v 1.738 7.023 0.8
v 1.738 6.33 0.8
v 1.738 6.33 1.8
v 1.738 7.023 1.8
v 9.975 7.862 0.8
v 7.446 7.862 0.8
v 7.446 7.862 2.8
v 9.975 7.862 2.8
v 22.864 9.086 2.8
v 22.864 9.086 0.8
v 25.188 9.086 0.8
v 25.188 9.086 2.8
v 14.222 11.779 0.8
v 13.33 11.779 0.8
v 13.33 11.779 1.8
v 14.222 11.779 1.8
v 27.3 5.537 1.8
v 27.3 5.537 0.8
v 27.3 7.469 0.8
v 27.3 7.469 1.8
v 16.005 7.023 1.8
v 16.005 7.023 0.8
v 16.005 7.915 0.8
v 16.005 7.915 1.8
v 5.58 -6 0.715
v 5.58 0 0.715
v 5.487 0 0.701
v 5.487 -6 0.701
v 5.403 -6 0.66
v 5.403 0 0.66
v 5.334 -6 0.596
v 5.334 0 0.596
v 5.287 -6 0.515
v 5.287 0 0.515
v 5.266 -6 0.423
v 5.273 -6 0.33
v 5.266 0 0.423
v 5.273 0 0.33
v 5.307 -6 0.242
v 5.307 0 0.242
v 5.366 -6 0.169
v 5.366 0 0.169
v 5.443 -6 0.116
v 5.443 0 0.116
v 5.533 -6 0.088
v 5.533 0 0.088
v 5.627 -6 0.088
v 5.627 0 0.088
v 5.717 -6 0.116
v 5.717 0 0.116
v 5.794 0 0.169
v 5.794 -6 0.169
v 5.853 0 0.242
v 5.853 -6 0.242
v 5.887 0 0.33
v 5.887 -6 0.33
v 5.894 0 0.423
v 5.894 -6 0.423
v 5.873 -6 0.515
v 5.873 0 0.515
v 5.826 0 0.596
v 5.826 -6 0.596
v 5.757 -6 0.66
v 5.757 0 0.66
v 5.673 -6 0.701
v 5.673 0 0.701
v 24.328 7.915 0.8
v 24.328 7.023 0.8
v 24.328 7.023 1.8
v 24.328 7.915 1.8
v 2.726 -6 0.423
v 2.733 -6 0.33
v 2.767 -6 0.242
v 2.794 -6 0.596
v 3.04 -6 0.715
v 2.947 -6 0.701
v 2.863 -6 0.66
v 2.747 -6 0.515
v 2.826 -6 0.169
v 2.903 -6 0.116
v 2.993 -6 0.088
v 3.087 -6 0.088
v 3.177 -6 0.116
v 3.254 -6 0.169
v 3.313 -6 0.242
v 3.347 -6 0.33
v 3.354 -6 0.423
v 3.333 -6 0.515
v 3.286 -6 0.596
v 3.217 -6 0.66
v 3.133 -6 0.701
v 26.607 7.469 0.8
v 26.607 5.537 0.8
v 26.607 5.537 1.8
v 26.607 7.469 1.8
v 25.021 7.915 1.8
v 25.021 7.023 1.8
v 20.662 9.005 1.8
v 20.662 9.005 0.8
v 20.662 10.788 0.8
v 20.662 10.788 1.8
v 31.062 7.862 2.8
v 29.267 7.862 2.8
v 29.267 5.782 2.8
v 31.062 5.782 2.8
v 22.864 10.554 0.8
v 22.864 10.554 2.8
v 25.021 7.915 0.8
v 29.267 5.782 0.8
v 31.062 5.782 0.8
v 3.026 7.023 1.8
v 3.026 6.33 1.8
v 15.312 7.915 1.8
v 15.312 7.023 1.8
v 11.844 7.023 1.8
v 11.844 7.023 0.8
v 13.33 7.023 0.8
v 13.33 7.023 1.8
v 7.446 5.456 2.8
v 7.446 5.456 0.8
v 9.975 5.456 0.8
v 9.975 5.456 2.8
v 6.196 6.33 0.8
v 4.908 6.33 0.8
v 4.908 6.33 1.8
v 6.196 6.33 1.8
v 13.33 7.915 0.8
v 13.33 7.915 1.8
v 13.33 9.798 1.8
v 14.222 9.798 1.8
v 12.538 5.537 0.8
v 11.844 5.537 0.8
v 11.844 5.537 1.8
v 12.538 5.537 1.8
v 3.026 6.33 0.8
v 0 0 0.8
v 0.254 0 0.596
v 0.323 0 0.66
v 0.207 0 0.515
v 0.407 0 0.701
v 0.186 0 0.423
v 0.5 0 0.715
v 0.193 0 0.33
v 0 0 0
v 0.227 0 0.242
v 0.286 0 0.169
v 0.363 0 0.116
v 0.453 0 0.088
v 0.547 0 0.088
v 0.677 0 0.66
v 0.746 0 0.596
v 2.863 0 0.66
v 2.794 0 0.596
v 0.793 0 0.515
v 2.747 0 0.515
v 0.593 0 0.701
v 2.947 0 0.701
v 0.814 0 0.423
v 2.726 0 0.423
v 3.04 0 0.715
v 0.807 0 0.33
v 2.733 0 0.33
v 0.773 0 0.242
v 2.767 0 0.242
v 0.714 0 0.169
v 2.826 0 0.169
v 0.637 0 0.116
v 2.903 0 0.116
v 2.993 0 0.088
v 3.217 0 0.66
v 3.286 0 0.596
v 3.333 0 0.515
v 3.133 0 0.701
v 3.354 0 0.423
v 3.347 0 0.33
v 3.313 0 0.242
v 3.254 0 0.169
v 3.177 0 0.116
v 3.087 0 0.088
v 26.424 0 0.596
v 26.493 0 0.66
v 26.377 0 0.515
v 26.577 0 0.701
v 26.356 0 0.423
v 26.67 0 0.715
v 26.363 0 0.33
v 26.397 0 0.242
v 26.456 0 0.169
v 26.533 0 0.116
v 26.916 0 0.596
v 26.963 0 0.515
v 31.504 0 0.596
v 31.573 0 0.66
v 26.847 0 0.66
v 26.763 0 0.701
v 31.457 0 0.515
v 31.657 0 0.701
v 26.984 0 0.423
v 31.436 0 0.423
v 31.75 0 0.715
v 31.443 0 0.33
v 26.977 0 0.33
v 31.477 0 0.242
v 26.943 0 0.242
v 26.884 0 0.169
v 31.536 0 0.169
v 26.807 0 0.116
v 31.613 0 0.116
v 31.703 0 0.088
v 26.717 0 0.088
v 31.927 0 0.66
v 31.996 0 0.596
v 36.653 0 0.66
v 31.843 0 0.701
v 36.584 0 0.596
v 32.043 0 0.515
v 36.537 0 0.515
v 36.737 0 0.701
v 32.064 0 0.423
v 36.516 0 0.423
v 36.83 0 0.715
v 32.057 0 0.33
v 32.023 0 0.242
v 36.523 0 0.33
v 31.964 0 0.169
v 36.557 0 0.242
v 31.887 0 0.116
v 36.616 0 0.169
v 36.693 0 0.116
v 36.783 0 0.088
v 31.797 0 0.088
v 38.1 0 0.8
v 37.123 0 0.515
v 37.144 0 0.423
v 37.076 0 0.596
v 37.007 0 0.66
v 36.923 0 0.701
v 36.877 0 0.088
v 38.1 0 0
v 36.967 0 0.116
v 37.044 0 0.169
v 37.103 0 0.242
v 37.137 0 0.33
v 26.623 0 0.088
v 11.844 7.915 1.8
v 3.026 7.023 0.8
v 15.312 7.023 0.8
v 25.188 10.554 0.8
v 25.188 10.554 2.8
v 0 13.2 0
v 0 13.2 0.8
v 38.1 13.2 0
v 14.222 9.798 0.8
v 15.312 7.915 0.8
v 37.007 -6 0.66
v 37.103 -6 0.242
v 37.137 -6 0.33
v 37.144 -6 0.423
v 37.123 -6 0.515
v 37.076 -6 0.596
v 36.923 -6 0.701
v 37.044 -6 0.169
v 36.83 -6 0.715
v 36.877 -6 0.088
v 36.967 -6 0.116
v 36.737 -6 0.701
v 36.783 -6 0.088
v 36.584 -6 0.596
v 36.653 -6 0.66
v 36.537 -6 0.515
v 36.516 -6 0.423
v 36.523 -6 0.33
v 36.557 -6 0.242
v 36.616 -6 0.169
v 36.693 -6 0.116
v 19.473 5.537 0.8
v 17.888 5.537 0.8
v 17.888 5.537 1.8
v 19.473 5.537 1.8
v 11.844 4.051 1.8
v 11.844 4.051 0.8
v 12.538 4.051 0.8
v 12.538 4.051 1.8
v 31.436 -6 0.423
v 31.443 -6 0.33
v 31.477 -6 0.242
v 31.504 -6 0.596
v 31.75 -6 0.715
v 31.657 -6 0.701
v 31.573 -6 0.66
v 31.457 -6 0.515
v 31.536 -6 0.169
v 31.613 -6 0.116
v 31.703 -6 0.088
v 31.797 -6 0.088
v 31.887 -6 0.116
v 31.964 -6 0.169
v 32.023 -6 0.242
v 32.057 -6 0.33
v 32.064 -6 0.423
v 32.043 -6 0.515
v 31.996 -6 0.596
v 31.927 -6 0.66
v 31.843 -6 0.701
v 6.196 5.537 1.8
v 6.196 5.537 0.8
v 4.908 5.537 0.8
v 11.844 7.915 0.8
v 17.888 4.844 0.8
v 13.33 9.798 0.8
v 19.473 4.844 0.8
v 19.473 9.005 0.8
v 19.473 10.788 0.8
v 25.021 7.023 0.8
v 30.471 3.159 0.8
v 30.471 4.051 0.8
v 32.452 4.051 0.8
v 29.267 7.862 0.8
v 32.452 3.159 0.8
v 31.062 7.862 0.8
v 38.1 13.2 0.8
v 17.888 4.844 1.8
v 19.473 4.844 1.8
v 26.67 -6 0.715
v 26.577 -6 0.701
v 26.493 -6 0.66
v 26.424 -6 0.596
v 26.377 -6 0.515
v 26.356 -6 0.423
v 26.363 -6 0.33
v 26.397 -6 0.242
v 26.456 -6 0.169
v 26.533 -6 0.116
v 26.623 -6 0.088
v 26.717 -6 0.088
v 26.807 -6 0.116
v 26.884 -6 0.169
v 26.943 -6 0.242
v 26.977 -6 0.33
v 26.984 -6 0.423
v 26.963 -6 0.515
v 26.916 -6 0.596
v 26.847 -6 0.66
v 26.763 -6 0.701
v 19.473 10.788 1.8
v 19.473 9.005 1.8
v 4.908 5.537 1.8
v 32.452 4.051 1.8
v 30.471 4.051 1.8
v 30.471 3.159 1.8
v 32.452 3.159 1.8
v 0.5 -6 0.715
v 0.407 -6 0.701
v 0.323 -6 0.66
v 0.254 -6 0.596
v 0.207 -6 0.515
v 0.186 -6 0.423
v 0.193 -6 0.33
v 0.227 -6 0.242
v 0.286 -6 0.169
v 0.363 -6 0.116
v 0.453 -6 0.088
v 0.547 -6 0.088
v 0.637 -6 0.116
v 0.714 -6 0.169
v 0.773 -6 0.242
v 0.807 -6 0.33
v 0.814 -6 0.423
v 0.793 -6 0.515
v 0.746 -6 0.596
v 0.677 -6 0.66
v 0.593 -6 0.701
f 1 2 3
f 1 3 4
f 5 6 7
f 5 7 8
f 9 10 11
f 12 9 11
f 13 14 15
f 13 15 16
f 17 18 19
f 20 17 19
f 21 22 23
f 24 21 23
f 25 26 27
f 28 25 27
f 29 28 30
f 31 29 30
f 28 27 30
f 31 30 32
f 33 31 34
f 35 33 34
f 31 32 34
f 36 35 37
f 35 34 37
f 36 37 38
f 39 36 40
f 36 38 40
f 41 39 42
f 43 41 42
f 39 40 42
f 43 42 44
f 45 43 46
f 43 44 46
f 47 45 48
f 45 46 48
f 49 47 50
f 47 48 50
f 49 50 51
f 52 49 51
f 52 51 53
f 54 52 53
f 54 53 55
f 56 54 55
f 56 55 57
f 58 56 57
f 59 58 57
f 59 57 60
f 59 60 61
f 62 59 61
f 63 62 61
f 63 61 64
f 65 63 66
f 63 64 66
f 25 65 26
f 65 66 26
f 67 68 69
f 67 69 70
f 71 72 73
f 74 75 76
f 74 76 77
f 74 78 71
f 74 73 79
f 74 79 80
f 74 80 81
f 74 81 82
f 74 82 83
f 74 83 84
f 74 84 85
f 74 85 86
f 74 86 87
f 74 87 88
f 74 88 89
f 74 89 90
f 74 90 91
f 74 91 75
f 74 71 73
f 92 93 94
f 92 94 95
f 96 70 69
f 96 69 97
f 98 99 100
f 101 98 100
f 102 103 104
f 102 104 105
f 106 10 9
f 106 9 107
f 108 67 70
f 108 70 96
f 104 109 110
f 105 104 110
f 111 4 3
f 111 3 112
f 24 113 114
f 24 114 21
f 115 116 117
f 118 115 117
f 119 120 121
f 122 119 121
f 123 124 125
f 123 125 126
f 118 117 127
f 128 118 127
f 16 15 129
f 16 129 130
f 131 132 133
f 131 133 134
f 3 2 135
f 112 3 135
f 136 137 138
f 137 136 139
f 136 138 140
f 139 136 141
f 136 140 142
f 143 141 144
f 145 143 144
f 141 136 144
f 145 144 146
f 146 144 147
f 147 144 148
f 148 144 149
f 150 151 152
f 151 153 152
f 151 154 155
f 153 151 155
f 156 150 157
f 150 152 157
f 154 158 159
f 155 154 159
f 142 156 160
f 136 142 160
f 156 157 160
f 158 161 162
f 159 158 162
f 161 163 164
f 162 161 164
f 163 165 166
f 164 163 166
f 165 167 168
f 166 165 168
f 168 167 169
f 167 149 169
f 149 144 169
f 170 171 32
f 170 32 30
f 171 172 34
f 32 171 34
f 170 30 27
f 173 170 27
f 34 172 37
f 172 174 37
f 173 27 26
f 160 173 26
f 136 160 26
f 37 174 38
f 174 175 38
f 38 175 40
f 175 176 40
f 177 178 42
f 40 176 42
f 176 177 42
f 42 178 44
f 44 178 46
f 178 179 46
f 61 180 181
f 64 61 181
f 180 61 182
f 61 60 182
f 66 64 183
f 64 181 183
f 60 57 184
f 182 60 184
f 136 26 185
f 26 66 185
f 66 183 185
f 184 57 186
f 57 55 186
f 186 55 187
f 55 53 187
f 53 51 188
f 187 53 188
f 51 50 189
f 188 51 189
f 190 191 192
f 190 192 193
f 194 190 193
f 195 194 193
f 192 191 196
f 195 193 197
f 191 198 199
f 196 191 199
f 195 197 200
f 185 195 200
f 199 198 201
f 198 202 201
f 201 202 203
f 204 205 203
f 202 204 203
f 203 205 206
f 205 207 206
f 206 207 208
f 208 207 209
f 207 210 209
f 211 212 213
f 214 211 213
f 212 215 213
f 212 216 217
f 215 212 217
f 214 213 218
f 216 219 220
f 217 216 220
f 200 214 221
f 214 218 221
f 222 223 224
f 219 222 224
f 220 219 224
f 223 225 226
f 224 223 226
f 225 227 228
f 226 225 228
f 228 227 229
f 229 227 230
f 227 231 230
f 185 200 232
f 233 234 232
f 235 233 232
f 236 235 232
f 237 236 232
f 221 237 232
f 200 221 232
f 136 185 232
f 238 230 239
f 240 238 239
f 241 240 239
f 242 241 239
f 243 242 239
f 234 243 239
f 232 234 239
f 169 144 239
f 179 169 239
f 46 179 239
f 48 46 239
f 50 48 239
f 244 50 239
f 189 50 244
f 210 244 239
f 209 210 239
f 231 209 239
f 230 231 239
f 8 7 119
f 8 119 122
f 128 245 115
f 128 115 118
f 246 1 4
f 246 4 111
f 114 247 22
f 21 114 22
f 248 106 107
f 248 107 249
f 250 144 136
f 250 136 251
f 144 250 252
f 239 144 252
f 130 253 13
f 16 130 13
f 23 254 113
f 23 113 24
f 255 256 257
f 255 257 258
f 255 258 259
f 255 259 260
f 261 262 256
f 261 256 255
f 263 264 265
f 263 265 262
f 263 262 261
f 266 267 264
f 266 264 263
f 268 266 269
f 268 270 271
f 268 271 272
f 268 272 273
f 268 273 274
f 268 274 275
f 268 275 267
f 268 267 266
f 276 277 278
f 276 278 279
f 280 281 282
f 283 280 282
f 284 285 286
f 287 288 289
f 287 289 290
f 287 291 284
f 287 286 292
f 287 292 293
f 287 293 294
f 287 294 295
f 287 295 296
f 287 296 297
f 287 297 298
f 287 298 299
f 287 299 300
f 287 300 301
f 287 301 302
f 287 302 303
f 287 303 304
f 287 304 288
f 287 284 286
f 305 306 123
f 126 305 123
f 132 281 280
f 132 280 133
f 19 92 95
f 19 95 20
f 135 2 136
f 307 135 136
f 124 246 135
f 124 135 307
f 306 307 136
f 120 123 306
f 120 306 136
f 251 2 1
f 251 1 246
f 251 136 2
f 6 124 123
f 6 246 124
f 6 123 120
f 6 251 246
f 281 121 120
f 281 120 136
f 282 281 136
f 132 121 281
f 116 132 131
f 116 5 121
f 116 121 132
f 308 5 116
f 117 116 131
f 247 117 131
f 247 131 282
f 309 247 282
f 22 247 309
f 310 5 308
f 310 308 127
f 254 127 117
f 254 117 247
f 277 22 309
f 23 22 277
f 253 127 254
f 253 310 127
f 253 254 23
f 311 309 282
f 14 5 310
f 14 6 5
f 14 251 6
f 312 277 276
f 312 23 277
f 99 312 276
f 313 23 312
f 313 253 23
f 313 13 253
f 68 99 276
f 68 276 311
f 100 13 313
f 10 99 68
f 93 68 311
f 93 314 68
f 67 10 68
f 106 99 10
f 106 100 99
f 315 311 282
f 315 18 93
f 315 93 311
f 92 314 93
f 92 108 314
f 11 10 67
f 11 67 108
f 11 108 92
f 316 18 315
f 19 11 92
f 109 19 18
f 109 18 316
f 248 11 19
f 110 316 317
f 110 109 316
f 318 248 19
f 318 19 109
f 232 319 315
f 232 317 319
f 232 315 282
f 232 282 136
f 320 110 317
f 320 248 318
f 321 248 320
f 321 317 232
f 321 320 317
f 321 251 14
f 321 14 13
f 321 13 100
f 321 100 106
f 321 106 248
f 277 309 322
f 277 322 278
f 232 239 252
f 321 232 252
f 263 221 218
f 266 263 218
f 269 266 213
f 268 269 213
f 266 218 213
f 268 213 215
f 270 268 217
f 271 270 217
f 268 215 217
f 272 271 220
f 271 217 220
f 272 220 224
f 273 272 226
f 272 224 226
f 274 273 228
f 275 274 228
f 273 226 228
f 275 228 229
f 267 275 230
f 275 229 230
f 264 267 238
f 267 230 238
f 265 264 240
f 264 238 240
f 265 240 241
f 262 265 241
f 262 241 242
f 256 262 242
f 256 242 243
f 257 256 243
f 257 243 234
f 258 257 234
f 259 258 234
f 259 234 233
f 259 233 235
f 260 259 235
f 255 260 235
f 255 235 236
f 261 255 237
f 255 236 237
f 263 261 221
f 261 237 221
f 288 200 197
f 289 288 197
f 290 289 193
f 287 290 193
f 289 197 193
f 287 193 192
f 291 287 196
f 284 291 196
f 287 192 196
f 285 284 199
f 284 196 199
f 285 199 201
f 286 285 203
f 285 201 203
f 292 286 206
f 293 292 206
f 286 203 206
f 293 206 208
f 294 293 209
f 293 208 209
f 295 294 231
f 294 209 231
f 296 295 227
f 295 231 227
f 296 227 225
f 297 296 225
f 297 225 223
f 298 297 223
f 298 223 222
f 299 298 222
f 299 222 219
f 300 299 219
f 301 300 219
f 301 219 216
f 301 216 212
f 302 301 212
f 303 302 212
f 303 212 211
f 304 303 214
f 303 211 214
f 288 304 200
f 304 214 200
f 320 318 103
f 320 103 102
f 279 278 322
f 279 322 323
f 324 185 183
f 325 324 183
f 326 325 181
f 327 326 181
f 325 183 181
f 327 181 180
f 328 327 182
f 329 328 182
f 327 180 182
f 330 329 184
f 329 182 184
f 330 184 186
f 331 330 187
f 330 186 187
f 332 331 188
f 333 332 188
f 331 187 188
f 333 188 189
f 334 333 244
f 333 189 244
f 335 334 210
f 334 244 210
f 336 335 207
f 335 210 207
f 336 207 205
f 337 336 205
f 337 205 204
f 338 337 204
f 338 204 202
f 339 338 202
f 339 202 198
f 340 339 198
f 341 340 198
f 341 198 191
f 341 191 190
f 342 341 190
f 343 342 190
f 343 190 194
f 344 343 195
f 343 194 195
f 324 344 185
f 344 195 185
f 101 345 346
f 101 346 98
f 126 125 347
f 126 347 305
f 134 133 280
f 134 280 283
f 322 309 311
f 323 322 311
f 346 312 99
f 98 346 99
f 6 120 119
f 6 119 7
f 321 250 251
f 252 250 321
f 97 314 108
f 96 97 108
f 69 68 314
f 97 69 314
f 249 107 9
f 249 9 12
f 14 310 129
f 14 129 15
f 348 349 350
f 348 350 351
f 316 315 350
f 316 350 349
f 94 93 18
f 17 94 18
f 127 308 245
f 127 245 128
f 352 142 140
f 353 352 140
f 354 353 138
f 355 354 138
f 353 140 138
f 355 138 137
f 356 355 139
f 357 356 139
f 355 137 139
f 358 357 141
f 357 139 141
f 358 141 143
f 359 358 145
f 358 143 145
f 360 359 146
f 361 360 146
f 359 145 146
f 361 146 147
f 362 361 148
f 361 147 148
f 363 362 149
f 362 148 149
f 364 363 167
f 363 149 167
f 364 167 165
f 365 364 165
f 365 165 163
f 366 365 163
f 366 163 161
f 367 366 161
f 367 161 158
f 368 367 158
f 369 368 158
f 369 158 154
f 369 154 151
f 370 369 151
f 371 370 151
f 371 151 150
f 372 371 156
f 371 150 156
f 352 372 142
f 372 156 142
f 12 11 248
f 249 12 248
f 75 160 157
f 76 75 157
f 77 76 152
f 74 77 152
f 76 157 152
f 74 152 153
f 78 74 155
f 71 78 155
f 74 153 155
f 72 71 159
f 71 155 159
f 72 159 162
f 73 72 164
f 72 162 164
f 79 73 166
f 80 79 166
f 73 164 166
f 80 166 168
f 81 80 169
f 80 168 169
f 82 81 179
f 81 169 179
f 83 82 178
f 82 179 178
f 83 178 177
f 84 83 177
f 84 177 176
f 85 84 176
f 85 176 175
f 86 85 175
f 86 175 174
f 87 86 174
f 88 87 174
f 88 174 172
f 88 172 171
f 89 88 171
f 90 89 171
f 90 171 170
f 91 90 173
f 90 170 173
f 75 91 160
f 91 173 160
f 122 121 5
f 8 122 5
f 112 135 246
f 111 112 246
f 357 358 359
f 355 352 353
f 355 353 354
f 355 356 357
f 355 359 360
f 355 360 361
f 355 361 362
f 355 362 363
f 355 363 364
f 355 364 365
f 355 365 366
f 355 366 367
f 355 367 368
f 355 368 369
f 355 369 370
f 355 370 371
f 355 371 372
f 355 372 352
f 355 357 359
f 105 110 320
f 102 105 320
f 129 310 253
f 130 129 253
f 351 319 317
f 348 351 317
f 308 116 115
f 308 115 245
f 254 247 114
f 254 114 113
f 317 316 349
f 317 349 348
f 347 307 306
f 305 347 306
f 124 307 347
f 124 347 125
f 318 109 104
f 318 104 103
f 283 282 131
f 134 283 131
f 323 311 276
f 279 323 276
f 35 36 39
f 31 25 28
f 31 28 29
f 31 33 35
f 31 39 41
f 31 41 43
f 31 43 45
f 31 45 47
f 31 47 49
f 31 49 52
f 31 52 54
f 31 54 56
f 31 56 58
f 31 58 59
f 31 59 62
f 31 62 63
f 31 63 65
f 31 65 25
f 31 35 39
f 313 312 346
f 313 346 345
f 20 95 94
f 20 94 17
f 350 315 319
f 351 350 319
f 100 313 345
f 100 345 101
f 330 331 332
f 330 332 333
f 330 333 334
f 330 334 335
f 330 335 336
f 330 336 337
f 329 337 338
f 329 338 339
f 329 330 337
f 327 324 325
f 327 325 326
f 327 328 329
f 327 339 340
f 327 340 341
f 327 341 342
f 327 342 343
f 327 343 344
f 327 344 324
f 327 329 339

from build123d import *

# Parameters (mm, degrees)
ESQUISSE1_W        = 38.1
ESQUISSE1_H        = 13.2
BOSS_EXTRU_1_DEPTH = 0.8
ESQUISSE2_R        = 0.315
BOSS_EXTRU_2_DEPTH = 6
ESQUISSE3_W        = 2.528787401
ESQUISSE3_H        = 2.40642672
ESQUISSE3_W_2      = 2.324852932
ESQUISSE3_H_2      = 1.468328168
ESQUISSE3_W_3      = 1.794623316
ESQUISSE3_H_3      = 2.080131572
BOSS_EXTRU_3_DEPTH = 2
ESQUISSE4_W        = 1.288030783
ESQUISSE4_H        = 0.792634328
ESQUISSE4_H_2      = 0.693555037
ESQUISSE4_W_2      = 0.693555037
ESQUISSE4_H_3      = 1.486189366
ESQUISSE4_W_3      = 1.486189365
ESQUISSE4_H_4      = 0.891713619
ESQUISSE4_W_4      = 1.585268657
ESQUISSE4_W_5      = 0.891713619
ESQUISSE4_H_5      = 1.981585821
ESQUISSE4_W_6      = 1.188951492
ESQUISSE4_H_6      = 1.783427238
ESQUISSE4_H_7      = 1.932046175
ESQUISSE4_W_7      = 1.98158582
BOSS_EXTRU_8_DEPTH = 1


with BuildPart() as part:
    # Esquisse1 → Boss.-Extru.1 (new body)
    with BuildSketch(Plane.XY):
        with Locations((19.05, 6.6)):
            Rectangle(ESQUISSE1_W, ESQUISSE1_H)
    extrude(amount=BOSS_EXTRU_1_DEPTH)

    # Esquisse2 → Boss.-Extru.2 (add)
    with BuildSketch(Plane.XZ):
        with Locations(Location((0.5, 0.399671485, 0), (0, 0, 90))):
            Circle(ESQUISSE2_R)
        with Locations(Location((3.04, 0.399671485, 0), (0, 0, 90))):
            Circle(ESQUISSE2_R)
        with Locations(Location((5.58, 0.399671485, 0), (0, 0, 90))):
            Circle(ESQUISSE2_R)
        with Locations(Location((26.67, 0.399671485, 0), (0, 0, 90))):
            Circle(ESQUISSE2_R)
        with Locations(Location((31.75, 0.399671485, 0), (0, 0, 90))):
            Circle(ESQUISSE2_R)
        with Locations(Location((36.83, 0.399671485, 0), (0, 0, 90))):
            Circle(ESQUISSE2_R)
    extrude(amount=BOSS_EXTRU_2_DEPTH)

    # Esquisse3 → Boss.-Extru.3 (add)
    with BuildSketch(Plane.XY.offset(0.8)):
        with Locations((8.710522484, 6.659017017)):
            Rectangle(ESQUISSE3_W, ESQUISSE3_H)
        with Locations((24.026001014, 9.820001267)):
            Rectangle(ESQUISSE3_W_2, ESQUISSE3_H_2)
        with Locations((30.164428494, 6.822164591)):
            Rectangle(ESQUISSE3_W_3, ESQUISSE3_H_3)
    extrude(amount=BOSS_EXTRU_3_DEPTH)

    # Esquisse4 → Boss.-Extru.8 (add)
    with BuildSketch(Plane.XY.offset(0.8)):
        with Locations((5.552416897, 5.933480073)):
            Rectangle(ESQUISSE4_W, ESQUISSE4_H)
        with Locations((2.381879584, 6.676574756)):
            Rectangle(ESQUISSE4_W, ESQUISSE4_H_2)
        with Locations((12.190729396, 4.794068226)):
            Rectangle(ESQUISSE4_W_2, ESQUISSE4_H_3)
        with Locations((12.58704656, 7.469209084)):
            Rectangle(ESQUISSE4_W_3, ESQUISSE4_H_4)
        with Locations((18.680422957, 5.190385391)):
            Rectangle(ESQUISSE4_W_4, ESQUISSE4_H_2)
        with Locations((15.658504582, 7.469209084)):
            Rectangle(ESQUISSE4_W_2, ESQUISSE4_H_4)
        with Locations((13.775998052, 10.788365333)):
            Rectangle(ESQUISSE4_W_5, ESQUISSE4_H_5)
        with Locations((20.067533032, 9.896651714)):
            Rectangle(ESQUISSE4_W_6, ESQUISSE4_H_6)
        with Locations((24.674720065, 7.469209084)):
            Rectangle(ESQUISSE4_W_2, ESQUISSE4_H_4)
        with Locations((26.953543759, 6.503185997)):
            Rectangle(ESQUISSE4_W_2, ESQUISSE4_H_7)
        with Locations((31.4616515, 3.605116734)):
            Rectangle(ESQUISSE4_W_7, ESQUISSE4_H_4)
    extrude(amount=BOSS_EXTRU_8_DEPTH)


solid = part.part
